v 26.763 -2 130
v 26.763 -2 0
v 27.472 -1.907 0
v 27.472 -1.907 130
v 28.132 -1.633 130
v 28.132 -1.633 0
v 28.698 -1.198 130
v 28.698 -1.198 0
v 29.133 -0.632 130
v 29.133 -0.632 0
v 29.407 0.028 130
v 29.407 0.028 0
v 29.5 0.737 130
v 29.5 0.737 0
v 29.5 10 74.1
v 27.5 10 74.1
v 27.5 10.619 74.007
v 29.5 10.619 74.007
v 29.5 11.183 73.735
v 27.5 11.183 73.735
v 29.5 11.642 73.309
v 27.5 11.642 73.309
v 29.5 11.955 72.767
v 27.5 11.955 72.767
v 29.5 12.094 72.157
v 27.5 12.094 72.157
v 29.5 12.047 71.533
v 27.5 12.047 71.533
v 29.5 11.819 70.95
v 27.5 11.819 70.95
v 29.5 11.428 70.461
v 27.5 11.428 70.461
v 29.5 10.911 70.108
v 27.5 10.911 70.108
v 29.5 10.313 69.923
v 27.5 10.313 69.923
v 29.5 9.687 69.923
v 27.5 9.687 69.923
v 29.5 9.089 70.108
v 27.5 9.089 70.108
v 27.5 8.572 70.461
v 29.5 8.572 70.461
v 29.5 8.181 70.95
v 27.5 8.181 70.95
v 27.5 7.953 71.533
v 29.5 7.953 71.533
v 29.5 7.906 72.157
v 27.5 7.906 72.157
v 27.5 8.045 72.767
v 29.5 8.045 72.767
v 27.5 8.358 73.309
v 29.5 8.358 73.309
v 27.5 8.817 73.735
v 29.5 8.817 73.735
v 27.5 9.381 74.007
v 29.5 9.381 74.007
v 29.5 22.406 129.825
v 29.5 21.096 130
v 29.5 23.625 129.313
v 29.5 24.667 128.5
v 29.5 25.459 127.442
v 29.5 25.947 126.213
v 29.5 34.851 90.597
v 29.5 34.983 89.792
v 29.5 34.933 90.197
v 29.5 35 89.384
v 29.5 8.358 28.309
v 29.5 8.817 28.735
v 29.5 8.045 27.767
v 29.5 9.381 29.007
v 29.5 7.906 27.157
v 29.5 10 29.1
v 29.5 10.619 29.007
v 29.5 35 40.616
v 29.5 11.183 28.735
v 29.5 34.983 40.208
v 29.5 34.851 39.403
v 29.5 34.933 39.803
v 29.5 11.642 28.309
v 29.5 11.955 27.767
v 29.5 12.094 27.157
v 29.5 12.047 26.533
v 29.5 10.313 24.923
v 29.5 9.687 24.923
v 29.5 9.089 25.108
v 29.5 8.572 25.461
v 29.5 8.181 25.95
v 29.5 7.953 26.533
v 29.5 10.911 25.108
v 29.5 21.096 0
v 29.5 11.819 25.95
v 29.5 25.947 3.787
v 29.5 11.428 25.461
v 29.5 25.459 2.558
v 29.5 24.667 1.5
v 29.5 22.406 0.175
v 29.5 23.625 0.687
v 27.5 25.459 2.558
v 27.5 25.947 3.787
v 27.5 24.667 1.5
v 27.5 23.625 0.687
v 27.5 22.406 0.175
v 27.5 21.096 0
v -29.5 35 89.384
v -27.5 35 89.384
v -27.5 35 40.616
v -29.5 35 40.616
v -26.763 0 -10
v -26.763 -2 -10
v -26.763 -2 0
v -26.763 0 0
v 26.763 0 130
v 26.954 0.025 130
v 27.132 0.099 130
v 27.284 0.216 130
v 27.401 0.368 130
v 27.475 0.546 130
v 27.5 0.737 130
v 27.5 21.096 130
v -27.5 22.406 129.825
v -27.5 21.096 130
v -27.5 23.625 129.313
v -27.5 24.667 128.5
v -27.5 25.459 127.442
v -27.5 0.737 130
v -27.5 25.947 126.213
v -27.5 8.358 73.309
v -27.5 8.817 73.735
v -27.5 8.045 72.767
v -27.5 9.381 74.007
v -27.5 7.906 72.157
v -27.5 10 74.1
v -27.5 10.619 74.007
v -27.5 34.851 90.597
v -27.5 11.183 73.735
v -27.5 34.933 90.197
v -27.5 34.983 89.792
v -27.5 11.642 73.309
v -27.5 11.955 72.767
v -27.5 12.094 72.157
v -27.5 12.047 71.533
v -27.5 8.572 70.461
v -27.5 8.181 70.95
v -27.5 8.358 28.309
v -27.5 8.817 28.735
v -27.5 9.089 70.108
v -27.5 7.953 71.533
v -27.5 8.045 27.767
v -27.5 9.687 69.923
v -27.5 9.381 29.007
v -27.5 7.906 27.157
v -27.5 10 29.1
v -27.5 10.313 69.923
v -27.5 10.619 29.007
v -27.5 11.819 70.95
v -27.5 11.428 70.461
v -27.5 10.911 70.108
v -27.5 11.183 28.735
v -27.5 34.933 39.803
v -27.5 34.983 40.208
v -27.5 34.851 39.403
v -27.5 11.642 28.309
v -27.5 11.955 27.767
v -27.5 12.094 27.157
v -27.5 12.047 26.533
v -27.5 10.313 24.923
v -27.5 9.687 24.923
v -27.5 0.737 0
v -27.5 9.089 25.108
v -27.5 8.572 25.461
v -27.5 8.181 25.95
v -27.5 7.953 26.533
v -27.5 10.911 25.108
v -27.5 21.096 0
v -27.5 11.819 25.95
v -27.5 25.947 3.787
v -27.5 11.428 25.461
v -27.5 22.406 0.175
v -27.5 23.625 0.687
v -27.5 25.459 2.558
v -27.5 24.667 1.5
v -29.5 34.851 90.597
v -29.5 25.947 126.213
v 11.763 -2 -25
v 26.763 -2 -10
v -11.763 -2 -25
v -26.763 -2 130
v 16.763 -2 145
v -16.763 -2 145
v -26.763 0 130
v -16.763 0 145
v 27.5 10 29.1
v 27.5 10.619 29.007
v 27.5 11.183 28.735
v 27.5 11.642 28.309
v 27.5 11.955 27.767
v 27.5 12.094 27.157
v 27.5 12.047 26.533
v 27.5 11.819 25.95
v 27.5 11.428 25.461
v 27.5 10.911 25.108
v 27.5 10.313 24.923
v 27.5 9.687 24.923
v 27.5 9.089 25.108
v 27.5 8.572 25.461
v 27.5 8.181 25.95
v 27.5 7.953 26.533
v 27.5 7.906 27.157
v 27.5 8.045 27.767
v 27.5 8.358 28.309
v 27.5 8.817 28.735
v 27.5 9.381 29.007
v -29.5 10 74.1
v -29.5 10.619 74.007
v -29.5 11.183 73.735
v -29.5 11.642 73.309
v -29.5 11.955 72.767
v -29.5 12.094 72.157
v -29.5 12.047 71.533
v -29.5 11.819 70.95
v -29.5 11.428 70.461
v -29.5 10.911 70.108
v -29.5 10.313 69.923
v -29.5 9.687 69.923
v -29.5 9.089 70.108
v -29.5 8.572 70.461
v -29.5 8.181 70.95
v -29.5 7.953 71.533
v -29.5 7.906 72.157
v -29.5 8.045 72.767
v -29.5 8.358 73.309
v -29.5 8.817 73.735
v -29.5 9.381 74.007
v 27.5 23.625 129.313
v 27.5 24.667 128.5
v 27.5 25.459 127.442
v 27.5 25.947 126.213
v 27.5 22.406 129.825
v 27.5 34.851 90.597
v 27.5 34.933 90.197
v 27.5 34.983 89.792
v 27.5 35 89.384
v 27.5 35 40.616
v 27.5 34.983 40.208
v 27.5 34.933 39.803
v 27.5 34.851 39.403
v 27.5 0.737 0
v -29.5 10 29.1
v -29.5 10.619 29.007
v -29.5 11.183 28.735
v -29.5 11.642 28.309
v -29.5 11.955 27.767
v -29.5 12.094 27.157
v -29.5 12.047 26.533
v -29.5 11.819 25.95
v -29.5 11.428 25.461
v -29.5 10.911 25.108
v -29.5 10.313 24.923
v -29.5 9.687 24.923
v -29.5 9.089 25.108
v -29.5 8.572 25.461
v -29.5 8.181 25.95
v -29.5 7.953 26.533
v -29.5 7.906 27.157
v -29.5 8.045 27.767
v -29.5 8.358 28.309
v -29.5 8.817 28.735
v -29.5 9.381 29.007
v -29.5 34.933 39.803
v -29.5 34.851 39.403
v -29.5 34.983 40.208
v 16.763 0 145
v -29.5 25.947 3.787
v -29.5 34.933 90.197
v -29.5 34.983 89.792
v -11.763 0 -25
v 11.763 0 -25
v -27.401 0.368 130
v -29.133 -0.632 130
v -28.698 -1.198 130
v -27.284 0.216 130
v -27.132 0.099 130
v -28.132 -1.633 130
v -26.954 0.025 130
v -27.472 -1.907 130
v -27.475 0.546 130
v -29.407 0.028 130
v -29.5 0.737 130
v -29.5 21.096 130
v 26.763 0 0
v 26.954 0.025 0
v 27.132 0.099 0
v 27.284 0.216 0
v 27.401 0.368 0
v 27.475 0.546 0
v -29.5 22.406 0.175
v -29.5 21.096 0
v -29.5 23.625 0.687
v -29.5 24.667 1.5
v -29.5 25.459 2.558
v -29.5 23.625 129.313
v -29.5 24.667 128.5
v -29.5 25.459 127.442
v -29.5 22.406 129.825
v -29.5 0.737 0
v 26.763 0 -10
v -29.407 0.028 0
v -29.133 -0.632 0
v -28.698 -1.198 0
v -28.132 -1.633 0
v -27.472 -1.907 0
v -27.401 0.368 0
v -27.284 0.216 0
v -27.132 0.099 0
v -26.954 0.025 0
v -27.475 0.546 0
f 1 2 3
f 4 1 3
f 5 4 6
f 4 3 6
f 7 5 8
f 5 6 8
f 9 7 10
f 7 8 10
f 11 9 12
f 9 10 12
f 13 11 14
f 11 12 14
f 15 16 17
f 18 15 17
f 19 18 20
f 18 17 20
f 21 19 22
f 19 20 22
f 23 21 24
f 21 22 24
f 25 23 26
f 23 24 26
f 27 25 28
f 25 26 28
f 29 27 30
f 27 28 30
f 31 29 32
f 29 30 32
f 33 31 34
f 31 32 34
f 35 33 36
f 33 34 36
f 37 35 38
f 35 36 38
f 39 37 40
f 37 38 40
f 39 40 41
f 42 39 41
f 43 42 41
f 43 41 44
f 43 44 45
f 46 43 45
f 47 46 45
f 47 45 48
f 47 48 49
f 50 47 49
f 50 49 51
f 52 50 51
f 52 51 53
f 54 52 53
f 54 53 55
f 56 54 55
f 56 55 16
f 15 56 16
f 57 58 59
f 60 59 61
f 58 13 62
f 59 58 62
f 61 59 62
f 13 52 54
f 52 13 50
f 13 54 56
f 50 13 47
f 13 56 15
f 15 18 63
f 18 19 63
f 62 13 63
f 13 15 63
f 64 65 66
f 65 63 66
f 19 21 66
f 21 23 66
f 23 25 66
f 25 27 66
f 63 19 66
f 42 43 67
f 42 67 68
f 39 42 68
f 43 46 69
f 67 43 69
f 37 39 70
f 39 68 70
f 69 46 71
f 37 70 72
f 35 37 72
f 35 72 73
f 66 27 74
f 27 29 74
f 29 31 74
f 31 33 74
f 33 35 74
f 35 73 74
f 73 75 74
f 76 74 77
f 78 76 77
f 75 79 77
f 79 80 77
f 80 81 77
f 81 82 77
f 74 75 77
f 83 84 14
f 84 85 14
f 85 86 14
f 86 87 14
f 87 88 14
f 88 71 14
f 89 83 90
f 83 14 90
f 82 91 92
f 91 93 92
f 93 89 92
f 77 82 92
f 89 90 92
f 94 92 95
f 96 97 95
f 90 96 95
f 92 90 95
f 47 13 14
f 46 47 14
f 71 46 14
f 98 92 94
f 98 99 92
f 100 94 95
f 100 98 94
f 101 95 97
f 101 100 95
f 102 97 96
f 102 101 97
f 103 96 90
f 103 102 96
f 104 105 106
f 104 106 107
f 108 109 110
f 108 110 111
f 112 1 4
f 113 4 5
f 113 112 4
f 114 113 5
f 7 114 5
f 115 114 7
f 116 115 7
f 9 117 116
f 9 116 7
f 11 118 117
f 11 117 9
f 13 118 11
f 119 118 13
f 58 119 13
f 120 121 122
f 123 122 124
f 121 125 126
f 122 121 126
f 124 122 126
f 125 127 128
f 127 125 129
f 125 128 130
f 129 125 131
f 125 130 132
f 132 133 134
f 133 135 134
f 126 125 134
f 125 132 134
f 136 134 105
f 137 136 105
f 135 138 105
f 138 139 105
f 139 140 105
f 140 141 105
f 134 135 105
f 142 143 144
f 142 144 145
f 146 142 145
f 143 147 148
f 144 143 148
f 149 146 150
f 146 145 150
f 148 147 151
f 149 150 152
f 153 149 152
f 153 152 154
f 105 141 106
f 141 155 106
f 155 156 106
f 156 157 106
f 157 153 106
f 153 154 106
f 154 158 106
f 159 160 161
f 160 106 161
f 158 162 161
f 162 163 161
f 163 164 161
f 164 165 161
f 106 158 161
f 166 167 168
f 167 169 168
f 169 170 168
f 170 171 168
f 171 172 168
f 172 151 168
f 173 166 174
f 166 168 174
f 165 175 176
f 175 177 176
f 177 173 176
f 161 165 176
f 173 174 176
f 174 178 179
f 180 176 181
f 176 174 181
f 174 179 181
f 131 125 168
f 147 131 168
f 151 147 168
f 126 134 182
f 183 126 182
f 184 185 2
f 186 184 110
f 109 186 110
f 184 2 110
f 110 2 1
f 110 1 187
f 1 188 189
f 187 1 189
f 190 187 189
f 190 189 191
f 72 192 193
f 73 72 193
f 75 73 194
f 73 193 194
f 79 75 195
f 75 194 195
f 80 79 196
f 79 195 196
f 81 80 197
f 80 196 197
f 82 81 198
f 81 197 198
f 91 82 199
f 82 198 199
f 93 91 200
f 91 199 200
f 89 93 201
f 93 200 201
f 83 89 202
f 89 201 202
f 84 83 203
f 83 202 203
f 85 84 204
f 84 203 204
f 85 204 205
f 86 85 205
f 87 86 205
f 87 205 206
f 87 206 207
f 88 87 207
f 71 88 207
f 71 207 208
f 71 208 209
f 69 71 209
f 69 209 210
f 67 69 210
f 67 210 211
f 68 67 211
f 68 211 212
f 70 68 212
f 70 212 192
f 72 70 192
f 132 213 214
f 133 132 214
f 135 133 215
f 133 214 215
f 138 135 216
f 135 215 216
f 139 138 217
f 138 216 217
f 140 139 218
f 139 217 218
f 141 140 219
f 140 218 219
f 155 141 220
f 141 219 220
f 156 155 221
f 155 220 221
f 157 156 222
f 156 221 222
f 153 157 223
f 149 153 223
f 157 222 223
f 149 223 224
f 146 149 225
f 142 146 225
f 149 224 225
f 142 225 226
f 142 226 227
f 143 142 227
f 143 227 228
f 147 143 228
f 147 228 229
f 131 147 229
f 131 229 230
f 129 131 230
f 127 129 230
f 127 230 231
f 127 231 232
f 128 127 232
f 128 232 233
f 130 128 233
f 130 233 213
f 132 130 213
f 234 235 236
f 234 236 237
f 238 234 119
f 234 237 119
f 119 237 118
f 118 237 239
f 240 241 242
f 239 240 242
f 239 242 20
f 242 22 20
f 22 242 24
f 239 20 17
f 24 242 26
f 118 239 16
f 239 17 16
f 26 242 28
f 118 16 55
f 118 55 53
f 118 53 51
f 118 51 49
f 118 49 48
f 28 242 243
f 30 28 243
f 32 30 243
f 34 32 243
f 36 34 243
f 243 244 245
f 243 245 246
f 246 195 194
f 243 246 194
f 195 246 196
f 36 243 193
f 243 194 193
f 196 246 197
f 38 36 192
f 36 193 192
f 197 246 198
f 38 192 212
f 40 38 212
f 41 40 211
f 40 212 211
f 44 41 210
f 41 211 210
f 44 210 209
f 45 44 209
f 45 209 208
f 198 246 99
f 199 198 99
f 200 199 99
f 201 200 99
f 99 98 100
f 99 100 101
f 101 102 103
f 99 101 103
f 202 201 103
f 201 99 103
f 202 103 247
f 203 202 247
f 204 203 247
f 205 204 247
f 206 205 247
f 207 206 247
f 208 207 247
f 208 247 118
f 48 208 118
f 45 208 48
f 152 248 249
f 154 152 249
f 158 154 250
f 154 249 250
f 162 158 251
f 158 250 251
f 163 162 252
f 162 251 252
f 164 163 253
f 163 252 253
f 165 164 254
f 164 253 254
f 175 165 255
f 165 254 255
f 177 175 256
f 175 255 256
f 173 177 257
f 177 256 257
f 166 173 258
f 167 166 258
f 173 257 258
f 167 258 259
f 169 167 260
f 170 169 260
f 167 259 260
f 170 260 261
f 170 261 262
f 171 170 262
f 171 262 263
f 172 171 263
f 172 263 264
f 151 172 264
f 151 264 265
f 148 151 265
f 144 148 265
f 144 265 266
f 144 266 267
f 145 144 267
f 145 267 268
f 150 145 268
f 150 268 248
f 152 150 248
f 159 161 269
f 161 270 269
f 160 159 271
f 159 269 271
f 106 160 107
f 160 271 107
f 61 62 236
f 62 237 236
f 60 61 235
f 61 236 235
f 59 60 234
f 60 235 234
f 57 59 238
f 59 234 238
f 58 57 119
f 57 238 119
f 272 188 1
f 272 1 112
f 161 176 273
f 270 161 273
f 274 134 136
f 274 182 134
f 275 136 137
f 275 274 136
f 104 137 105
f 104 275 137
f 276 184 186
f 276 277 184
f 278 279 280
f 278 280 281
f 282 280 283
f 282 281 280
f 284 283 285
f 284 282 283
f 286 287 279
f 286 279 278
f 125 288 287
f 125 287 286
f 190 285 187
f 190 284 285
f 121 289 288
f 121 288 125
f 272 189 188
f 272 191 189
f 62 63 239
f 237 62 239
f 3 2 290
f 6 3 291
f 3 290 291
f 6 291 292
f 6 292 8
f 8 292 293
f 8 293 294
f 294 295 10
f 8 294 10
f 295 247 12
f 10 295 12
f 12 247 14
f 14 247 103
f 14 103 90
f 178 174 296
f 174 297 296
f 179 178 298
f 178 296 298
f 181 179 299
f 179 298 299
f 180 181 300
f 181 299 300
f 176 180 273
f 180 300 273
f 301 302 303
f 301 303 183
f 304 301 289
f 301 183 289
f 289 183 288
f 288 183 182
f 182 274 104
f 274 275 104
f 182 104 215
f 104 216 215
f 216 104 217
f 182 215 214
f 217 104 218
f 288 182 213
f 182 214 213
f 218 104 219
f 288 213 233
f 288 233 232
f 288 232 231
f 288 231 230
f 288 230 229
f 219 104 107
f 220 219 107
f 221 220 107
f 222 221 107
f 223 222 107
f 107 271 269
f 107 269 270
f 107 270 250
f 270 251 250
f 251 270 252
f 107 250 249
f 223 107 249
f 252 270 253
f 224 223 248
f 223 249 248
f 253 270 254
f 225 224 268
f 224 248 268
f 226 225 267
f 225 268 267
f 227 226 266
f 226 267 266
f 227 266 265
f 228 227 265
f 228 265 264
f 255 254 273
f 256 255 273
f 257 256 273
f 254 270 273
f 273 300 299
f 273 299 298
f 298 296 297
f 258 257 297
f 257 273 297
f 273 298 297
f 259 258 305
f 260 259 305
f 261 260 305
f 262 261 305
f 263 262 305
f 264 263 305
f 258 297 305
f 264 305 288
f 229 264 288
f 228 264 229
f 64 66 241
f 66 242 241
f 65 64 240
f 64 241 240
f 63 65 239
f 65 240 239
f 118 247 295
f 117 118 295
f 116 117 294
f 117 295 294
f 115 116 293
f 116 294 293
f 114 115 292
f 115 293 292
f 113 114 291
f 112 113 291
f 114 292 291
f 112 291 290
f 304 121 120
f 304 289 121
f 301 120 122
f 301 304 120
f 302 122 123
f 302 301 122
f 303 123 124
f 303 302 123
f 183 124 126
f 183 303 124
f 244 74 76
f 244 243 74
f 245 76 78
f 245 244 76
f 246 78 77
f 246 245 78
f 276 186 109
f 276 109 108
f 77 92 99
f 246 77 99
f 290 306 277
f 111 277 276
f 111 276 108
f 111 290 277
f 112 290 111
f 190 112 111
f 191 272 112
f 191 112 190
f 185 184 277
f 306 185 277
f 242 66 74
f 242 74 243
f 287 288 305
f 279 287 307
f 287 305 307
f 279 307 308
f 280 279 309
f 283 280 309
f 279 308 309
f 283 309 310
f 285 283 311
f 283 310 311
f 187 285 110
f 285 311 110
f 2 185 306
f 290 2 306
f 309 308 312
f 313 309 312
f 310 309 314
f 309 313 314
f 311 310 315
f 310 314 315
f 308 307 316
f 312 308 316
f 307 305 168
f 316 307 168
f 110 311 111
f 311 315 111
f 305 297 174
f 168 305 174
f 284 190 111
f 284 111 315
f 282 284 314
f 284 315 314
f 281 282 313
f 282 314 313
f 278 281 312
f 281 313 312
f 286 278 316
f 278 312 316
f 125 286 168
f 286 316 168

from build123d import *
from OCP.BRepFilletAPI import BRepFilletAPI_MakeChamfer

# Parameters (mm, degrees)
SM_BASE_FLANGE_1_DEPTH = 130
SKETCH_6_R             = 2.1
CUT_EXTRUDE_1_DEPTH    = 147.989795564
PATTERN_LINEAR_1_COUNT = 2
PATTERN_LINEAR_1_PITCH = 45
CHAMFER_1_SIZE         = 10
CHAMFER_1_SIZE2        = 40
CHAMFER_2_SIZE         = 40
CHAMFER_2_SIZE2        = 10
FILLET_1_R             = 5
SKETCH_9_W             = 53.5268
SKETCH_9_H             = 2
EXTRUDE_1_DEPTH        = 15
CHAMFER_5_SIZE         = 10
CHAMFER_5_SIZE_2       = 15
SKETCH_11_W            = 53.5268
SKETCH_11_H            = 2
EXTRUDE_2_DEPTH        = 25
CHAMFER_6_SIZE         = 15


# Read off the part's stored shape, not the designer's step: 基材-凸緣1
with BuildPart() as part:
    # 基材-凸緣1 outline → 基材-凸緣1 (new body)
    with BuildSketch(Plane.XY):
        with BuildLine():
            Line((29.5, 0.7366), (29.5, 35))
            Line((29.5, 35), (27.5, 35))
            Line((27.5, 35), (27.5, 0.7366))
            ThreePointArc((27.5, 0.7366), (27.284254855, 0.215745145), (26.7634, 0))
            Line((26.7634, 0), (-26.7634, 0))
            ThreePointArc((-26.7634, 0), (-27.284254855, 0.215745145), (-27.5, 0.7366))
            Line((-27.5, 0.7366), (-27.5, 35))
            Line((-27.5, 35), (-29.5, 35))
            Line((-29.5, 35), (-29.5, 0.7366))
            ThreePointArc((-29.5, 0.7366), (-28.698468417, -1.198468417), (-26.7634, -2))
            Line((-26.7634, -2), (26.7634, -2))
            ThreePointArc((26.7634, -2), (28.698468417, -1.198468417), (29.5, 0.7366))
        make_face()
    extrude(amount=SM_BASE_FLANGE_1_DEPTH)

    # 草圖6 → 除料-伸長1 (cut, through all)
    with BuildSketch(Plane.ZY.offset(29.5)):
        with Locations((72, 10)):
            Circle(SKETCH_6_R)
    cut_extrude_1 = extrude(amount=-CUT_EXTRUDE_1_DEPTH, mode=Mode.SUBTRACT)

    # 直線複製排列1: 除料-伸長1 ×2
    with Locations(*[(0, 0, -i * PATTERN_LINEAR_1_PITCH) for i in range(1, PATTERN_LINEAR_1_COUNT)]):
        add(cut_extrude_1, mode=Mode.SUBTRACT)

    # 導角1
    chamfer_1_edges = [part.edges().sort_by_distance(p)[0] for p in [
        (-28.5, 35, 130),
        (28.5, 35, 130),
    ]]
    chamfer_1_side = [part.faces().sort_by_distance(p)[0] for p in [
        (0, -1.303580586, 130),
    ]]
    chamfer(chamfer_1_edges, length=CHAMFER_1_SIZE, length2=CHAMFER_1_SIZE2, reference=chamfer_1_side[0])

    # 導角2: one chamfer whose edges measure the first distance from different faces: ONE call of the kernel's chamfer builder (chamfer() names one face for all edges)
    chamfer_2_edges_1 = [part.edges().sort_by_distance(p)[0] for p in [
        (-28.5, 35, 0),
    ]]
    chamfer_2_side_1 = [part.faces().sort_by_distance(p)[0] for p in [
        (-28.5, 35, 45),
    ]]
    chamfer_2_edges_2 = [part.edges().sort_by_distance(p)[0] for p in [
        (28.5, 35, 0),
    ]]
    chamfer_2_side_2 = [part.faces().sort_by_distance(p)[0] for p in [
        (28.5, 35, 45),
    ]]
    chamfer_2 = BRepFilletAPI_MakeChamfer(part.part.solid().wrapped)
    for e in chamfer_2_edges_1:
        chamfer_2.Add(CHAMFER_2_SIZE, CHAMFER_2_SIZE2, e.wrapped, chamfer_2_side_1[0].wrapped)  # the first distance lies on this face
    for e in chamfer_2_edges_2:
        chamfer_2.Add(CHAMFER_2_SIZE, CHAMFER_2_SIZE2, e.wrapped, chamfer_2_side_2[0].wrapped)  # the first distance lies on this face
    add(Compound.cast(chamfer_2.Shape()), mode=Mode.REPLACE)

    # 圓角1
    fillet_1_edges = [part.edges().sort_by_distance(p)[0] for p in [
        (28.5, 35, 90),
        (28.5, 25, 130),
        (-28.5, 35, 90),
        (-28.5, 25, 130),
        (-28.5, 25, 0),
        (-28.5, 35, 40),
        (28.5, 25, 0),
        (28.5, 35, 40),
    ]]
    fillet(fillet_1_edges, radius=FILLET_1_R)

    # 草圖9 → 填料-伸長1 (add)
    with BuildSketch(Plane.XY.offset(130)):
        with Locations((0, -1)):
            Rectangle(SKETCH_9_W, SKETCH_9_H)
    extrude(amount=EXTRUDE_1_DEPTH)

    # 導角5
    chamfer_5_edges_1 = [part.edges().sort_by_distance(p)[0] for p in [
        (-26.7634, -1, 145),
    ]]
    chamfer_5_side_1 = [part.faces().sort_by_distance(p)[0] for p in [
        (-26.5634, -1, 145),
    ]]
    chamfer_5_edges_2 = [part.edges().sort_by_distance(p)[0] for p in [
        (26.7634, -1, 145),
    ]]
    chamfer_5_side_2 = [part.faces().sort_by_distance(p)[0] for p in [
        (26.7634, -1, 144.8),
    ]]
    chamfer_5 = BRepFilletAPI_MakeChamfer(part.part.solid().wrapped)
    for e in chamfer_5_edges_1:
        chamfer_5.Add(CHAMFER_5_SIZE - 0.0001, CHAMFER_5_SIZE_2 - 0.0001, e.wrapped, chamfer_5_side_1[0].wrapped)
    for e in chamfer_5_edges_2:
        chamfer_5.Add(CHAMFER_5_SIZE_2 - 0.0001, CHAMFER_5_SIZE - 0.0001, e.wrapped, chamfer_5_side_2[0].wrapped)
    add(Compound.cast(chamfer_5.Shape()), mode=Mode.REPLACE)  # a hair under: the kernel refuses the full size

    # 草圖11 → 填料-伸長2 (add)
    with BuildSketch(Plane(origin=(0, 0, 0), x_dir=(-1, 0, 0), z_dir=(0, 0, -1))):
        with Locations((0, -1)):
            Rectangle(SKETCH_11_W, SKETCH_11_H)
    extrude(amount=EXTRUDE_2_DEPTH)

    # 導角6
    chamfer_6_edges = [part.edges().sort_by_distance(p)[0] for p in [
        (26.7634, -1, -25),
        (-26.7634, -1, -25),
    ]]
    chamfer(chamfer_6_edges, length=CHAMFER_6_SIZE)


solid = part.part
